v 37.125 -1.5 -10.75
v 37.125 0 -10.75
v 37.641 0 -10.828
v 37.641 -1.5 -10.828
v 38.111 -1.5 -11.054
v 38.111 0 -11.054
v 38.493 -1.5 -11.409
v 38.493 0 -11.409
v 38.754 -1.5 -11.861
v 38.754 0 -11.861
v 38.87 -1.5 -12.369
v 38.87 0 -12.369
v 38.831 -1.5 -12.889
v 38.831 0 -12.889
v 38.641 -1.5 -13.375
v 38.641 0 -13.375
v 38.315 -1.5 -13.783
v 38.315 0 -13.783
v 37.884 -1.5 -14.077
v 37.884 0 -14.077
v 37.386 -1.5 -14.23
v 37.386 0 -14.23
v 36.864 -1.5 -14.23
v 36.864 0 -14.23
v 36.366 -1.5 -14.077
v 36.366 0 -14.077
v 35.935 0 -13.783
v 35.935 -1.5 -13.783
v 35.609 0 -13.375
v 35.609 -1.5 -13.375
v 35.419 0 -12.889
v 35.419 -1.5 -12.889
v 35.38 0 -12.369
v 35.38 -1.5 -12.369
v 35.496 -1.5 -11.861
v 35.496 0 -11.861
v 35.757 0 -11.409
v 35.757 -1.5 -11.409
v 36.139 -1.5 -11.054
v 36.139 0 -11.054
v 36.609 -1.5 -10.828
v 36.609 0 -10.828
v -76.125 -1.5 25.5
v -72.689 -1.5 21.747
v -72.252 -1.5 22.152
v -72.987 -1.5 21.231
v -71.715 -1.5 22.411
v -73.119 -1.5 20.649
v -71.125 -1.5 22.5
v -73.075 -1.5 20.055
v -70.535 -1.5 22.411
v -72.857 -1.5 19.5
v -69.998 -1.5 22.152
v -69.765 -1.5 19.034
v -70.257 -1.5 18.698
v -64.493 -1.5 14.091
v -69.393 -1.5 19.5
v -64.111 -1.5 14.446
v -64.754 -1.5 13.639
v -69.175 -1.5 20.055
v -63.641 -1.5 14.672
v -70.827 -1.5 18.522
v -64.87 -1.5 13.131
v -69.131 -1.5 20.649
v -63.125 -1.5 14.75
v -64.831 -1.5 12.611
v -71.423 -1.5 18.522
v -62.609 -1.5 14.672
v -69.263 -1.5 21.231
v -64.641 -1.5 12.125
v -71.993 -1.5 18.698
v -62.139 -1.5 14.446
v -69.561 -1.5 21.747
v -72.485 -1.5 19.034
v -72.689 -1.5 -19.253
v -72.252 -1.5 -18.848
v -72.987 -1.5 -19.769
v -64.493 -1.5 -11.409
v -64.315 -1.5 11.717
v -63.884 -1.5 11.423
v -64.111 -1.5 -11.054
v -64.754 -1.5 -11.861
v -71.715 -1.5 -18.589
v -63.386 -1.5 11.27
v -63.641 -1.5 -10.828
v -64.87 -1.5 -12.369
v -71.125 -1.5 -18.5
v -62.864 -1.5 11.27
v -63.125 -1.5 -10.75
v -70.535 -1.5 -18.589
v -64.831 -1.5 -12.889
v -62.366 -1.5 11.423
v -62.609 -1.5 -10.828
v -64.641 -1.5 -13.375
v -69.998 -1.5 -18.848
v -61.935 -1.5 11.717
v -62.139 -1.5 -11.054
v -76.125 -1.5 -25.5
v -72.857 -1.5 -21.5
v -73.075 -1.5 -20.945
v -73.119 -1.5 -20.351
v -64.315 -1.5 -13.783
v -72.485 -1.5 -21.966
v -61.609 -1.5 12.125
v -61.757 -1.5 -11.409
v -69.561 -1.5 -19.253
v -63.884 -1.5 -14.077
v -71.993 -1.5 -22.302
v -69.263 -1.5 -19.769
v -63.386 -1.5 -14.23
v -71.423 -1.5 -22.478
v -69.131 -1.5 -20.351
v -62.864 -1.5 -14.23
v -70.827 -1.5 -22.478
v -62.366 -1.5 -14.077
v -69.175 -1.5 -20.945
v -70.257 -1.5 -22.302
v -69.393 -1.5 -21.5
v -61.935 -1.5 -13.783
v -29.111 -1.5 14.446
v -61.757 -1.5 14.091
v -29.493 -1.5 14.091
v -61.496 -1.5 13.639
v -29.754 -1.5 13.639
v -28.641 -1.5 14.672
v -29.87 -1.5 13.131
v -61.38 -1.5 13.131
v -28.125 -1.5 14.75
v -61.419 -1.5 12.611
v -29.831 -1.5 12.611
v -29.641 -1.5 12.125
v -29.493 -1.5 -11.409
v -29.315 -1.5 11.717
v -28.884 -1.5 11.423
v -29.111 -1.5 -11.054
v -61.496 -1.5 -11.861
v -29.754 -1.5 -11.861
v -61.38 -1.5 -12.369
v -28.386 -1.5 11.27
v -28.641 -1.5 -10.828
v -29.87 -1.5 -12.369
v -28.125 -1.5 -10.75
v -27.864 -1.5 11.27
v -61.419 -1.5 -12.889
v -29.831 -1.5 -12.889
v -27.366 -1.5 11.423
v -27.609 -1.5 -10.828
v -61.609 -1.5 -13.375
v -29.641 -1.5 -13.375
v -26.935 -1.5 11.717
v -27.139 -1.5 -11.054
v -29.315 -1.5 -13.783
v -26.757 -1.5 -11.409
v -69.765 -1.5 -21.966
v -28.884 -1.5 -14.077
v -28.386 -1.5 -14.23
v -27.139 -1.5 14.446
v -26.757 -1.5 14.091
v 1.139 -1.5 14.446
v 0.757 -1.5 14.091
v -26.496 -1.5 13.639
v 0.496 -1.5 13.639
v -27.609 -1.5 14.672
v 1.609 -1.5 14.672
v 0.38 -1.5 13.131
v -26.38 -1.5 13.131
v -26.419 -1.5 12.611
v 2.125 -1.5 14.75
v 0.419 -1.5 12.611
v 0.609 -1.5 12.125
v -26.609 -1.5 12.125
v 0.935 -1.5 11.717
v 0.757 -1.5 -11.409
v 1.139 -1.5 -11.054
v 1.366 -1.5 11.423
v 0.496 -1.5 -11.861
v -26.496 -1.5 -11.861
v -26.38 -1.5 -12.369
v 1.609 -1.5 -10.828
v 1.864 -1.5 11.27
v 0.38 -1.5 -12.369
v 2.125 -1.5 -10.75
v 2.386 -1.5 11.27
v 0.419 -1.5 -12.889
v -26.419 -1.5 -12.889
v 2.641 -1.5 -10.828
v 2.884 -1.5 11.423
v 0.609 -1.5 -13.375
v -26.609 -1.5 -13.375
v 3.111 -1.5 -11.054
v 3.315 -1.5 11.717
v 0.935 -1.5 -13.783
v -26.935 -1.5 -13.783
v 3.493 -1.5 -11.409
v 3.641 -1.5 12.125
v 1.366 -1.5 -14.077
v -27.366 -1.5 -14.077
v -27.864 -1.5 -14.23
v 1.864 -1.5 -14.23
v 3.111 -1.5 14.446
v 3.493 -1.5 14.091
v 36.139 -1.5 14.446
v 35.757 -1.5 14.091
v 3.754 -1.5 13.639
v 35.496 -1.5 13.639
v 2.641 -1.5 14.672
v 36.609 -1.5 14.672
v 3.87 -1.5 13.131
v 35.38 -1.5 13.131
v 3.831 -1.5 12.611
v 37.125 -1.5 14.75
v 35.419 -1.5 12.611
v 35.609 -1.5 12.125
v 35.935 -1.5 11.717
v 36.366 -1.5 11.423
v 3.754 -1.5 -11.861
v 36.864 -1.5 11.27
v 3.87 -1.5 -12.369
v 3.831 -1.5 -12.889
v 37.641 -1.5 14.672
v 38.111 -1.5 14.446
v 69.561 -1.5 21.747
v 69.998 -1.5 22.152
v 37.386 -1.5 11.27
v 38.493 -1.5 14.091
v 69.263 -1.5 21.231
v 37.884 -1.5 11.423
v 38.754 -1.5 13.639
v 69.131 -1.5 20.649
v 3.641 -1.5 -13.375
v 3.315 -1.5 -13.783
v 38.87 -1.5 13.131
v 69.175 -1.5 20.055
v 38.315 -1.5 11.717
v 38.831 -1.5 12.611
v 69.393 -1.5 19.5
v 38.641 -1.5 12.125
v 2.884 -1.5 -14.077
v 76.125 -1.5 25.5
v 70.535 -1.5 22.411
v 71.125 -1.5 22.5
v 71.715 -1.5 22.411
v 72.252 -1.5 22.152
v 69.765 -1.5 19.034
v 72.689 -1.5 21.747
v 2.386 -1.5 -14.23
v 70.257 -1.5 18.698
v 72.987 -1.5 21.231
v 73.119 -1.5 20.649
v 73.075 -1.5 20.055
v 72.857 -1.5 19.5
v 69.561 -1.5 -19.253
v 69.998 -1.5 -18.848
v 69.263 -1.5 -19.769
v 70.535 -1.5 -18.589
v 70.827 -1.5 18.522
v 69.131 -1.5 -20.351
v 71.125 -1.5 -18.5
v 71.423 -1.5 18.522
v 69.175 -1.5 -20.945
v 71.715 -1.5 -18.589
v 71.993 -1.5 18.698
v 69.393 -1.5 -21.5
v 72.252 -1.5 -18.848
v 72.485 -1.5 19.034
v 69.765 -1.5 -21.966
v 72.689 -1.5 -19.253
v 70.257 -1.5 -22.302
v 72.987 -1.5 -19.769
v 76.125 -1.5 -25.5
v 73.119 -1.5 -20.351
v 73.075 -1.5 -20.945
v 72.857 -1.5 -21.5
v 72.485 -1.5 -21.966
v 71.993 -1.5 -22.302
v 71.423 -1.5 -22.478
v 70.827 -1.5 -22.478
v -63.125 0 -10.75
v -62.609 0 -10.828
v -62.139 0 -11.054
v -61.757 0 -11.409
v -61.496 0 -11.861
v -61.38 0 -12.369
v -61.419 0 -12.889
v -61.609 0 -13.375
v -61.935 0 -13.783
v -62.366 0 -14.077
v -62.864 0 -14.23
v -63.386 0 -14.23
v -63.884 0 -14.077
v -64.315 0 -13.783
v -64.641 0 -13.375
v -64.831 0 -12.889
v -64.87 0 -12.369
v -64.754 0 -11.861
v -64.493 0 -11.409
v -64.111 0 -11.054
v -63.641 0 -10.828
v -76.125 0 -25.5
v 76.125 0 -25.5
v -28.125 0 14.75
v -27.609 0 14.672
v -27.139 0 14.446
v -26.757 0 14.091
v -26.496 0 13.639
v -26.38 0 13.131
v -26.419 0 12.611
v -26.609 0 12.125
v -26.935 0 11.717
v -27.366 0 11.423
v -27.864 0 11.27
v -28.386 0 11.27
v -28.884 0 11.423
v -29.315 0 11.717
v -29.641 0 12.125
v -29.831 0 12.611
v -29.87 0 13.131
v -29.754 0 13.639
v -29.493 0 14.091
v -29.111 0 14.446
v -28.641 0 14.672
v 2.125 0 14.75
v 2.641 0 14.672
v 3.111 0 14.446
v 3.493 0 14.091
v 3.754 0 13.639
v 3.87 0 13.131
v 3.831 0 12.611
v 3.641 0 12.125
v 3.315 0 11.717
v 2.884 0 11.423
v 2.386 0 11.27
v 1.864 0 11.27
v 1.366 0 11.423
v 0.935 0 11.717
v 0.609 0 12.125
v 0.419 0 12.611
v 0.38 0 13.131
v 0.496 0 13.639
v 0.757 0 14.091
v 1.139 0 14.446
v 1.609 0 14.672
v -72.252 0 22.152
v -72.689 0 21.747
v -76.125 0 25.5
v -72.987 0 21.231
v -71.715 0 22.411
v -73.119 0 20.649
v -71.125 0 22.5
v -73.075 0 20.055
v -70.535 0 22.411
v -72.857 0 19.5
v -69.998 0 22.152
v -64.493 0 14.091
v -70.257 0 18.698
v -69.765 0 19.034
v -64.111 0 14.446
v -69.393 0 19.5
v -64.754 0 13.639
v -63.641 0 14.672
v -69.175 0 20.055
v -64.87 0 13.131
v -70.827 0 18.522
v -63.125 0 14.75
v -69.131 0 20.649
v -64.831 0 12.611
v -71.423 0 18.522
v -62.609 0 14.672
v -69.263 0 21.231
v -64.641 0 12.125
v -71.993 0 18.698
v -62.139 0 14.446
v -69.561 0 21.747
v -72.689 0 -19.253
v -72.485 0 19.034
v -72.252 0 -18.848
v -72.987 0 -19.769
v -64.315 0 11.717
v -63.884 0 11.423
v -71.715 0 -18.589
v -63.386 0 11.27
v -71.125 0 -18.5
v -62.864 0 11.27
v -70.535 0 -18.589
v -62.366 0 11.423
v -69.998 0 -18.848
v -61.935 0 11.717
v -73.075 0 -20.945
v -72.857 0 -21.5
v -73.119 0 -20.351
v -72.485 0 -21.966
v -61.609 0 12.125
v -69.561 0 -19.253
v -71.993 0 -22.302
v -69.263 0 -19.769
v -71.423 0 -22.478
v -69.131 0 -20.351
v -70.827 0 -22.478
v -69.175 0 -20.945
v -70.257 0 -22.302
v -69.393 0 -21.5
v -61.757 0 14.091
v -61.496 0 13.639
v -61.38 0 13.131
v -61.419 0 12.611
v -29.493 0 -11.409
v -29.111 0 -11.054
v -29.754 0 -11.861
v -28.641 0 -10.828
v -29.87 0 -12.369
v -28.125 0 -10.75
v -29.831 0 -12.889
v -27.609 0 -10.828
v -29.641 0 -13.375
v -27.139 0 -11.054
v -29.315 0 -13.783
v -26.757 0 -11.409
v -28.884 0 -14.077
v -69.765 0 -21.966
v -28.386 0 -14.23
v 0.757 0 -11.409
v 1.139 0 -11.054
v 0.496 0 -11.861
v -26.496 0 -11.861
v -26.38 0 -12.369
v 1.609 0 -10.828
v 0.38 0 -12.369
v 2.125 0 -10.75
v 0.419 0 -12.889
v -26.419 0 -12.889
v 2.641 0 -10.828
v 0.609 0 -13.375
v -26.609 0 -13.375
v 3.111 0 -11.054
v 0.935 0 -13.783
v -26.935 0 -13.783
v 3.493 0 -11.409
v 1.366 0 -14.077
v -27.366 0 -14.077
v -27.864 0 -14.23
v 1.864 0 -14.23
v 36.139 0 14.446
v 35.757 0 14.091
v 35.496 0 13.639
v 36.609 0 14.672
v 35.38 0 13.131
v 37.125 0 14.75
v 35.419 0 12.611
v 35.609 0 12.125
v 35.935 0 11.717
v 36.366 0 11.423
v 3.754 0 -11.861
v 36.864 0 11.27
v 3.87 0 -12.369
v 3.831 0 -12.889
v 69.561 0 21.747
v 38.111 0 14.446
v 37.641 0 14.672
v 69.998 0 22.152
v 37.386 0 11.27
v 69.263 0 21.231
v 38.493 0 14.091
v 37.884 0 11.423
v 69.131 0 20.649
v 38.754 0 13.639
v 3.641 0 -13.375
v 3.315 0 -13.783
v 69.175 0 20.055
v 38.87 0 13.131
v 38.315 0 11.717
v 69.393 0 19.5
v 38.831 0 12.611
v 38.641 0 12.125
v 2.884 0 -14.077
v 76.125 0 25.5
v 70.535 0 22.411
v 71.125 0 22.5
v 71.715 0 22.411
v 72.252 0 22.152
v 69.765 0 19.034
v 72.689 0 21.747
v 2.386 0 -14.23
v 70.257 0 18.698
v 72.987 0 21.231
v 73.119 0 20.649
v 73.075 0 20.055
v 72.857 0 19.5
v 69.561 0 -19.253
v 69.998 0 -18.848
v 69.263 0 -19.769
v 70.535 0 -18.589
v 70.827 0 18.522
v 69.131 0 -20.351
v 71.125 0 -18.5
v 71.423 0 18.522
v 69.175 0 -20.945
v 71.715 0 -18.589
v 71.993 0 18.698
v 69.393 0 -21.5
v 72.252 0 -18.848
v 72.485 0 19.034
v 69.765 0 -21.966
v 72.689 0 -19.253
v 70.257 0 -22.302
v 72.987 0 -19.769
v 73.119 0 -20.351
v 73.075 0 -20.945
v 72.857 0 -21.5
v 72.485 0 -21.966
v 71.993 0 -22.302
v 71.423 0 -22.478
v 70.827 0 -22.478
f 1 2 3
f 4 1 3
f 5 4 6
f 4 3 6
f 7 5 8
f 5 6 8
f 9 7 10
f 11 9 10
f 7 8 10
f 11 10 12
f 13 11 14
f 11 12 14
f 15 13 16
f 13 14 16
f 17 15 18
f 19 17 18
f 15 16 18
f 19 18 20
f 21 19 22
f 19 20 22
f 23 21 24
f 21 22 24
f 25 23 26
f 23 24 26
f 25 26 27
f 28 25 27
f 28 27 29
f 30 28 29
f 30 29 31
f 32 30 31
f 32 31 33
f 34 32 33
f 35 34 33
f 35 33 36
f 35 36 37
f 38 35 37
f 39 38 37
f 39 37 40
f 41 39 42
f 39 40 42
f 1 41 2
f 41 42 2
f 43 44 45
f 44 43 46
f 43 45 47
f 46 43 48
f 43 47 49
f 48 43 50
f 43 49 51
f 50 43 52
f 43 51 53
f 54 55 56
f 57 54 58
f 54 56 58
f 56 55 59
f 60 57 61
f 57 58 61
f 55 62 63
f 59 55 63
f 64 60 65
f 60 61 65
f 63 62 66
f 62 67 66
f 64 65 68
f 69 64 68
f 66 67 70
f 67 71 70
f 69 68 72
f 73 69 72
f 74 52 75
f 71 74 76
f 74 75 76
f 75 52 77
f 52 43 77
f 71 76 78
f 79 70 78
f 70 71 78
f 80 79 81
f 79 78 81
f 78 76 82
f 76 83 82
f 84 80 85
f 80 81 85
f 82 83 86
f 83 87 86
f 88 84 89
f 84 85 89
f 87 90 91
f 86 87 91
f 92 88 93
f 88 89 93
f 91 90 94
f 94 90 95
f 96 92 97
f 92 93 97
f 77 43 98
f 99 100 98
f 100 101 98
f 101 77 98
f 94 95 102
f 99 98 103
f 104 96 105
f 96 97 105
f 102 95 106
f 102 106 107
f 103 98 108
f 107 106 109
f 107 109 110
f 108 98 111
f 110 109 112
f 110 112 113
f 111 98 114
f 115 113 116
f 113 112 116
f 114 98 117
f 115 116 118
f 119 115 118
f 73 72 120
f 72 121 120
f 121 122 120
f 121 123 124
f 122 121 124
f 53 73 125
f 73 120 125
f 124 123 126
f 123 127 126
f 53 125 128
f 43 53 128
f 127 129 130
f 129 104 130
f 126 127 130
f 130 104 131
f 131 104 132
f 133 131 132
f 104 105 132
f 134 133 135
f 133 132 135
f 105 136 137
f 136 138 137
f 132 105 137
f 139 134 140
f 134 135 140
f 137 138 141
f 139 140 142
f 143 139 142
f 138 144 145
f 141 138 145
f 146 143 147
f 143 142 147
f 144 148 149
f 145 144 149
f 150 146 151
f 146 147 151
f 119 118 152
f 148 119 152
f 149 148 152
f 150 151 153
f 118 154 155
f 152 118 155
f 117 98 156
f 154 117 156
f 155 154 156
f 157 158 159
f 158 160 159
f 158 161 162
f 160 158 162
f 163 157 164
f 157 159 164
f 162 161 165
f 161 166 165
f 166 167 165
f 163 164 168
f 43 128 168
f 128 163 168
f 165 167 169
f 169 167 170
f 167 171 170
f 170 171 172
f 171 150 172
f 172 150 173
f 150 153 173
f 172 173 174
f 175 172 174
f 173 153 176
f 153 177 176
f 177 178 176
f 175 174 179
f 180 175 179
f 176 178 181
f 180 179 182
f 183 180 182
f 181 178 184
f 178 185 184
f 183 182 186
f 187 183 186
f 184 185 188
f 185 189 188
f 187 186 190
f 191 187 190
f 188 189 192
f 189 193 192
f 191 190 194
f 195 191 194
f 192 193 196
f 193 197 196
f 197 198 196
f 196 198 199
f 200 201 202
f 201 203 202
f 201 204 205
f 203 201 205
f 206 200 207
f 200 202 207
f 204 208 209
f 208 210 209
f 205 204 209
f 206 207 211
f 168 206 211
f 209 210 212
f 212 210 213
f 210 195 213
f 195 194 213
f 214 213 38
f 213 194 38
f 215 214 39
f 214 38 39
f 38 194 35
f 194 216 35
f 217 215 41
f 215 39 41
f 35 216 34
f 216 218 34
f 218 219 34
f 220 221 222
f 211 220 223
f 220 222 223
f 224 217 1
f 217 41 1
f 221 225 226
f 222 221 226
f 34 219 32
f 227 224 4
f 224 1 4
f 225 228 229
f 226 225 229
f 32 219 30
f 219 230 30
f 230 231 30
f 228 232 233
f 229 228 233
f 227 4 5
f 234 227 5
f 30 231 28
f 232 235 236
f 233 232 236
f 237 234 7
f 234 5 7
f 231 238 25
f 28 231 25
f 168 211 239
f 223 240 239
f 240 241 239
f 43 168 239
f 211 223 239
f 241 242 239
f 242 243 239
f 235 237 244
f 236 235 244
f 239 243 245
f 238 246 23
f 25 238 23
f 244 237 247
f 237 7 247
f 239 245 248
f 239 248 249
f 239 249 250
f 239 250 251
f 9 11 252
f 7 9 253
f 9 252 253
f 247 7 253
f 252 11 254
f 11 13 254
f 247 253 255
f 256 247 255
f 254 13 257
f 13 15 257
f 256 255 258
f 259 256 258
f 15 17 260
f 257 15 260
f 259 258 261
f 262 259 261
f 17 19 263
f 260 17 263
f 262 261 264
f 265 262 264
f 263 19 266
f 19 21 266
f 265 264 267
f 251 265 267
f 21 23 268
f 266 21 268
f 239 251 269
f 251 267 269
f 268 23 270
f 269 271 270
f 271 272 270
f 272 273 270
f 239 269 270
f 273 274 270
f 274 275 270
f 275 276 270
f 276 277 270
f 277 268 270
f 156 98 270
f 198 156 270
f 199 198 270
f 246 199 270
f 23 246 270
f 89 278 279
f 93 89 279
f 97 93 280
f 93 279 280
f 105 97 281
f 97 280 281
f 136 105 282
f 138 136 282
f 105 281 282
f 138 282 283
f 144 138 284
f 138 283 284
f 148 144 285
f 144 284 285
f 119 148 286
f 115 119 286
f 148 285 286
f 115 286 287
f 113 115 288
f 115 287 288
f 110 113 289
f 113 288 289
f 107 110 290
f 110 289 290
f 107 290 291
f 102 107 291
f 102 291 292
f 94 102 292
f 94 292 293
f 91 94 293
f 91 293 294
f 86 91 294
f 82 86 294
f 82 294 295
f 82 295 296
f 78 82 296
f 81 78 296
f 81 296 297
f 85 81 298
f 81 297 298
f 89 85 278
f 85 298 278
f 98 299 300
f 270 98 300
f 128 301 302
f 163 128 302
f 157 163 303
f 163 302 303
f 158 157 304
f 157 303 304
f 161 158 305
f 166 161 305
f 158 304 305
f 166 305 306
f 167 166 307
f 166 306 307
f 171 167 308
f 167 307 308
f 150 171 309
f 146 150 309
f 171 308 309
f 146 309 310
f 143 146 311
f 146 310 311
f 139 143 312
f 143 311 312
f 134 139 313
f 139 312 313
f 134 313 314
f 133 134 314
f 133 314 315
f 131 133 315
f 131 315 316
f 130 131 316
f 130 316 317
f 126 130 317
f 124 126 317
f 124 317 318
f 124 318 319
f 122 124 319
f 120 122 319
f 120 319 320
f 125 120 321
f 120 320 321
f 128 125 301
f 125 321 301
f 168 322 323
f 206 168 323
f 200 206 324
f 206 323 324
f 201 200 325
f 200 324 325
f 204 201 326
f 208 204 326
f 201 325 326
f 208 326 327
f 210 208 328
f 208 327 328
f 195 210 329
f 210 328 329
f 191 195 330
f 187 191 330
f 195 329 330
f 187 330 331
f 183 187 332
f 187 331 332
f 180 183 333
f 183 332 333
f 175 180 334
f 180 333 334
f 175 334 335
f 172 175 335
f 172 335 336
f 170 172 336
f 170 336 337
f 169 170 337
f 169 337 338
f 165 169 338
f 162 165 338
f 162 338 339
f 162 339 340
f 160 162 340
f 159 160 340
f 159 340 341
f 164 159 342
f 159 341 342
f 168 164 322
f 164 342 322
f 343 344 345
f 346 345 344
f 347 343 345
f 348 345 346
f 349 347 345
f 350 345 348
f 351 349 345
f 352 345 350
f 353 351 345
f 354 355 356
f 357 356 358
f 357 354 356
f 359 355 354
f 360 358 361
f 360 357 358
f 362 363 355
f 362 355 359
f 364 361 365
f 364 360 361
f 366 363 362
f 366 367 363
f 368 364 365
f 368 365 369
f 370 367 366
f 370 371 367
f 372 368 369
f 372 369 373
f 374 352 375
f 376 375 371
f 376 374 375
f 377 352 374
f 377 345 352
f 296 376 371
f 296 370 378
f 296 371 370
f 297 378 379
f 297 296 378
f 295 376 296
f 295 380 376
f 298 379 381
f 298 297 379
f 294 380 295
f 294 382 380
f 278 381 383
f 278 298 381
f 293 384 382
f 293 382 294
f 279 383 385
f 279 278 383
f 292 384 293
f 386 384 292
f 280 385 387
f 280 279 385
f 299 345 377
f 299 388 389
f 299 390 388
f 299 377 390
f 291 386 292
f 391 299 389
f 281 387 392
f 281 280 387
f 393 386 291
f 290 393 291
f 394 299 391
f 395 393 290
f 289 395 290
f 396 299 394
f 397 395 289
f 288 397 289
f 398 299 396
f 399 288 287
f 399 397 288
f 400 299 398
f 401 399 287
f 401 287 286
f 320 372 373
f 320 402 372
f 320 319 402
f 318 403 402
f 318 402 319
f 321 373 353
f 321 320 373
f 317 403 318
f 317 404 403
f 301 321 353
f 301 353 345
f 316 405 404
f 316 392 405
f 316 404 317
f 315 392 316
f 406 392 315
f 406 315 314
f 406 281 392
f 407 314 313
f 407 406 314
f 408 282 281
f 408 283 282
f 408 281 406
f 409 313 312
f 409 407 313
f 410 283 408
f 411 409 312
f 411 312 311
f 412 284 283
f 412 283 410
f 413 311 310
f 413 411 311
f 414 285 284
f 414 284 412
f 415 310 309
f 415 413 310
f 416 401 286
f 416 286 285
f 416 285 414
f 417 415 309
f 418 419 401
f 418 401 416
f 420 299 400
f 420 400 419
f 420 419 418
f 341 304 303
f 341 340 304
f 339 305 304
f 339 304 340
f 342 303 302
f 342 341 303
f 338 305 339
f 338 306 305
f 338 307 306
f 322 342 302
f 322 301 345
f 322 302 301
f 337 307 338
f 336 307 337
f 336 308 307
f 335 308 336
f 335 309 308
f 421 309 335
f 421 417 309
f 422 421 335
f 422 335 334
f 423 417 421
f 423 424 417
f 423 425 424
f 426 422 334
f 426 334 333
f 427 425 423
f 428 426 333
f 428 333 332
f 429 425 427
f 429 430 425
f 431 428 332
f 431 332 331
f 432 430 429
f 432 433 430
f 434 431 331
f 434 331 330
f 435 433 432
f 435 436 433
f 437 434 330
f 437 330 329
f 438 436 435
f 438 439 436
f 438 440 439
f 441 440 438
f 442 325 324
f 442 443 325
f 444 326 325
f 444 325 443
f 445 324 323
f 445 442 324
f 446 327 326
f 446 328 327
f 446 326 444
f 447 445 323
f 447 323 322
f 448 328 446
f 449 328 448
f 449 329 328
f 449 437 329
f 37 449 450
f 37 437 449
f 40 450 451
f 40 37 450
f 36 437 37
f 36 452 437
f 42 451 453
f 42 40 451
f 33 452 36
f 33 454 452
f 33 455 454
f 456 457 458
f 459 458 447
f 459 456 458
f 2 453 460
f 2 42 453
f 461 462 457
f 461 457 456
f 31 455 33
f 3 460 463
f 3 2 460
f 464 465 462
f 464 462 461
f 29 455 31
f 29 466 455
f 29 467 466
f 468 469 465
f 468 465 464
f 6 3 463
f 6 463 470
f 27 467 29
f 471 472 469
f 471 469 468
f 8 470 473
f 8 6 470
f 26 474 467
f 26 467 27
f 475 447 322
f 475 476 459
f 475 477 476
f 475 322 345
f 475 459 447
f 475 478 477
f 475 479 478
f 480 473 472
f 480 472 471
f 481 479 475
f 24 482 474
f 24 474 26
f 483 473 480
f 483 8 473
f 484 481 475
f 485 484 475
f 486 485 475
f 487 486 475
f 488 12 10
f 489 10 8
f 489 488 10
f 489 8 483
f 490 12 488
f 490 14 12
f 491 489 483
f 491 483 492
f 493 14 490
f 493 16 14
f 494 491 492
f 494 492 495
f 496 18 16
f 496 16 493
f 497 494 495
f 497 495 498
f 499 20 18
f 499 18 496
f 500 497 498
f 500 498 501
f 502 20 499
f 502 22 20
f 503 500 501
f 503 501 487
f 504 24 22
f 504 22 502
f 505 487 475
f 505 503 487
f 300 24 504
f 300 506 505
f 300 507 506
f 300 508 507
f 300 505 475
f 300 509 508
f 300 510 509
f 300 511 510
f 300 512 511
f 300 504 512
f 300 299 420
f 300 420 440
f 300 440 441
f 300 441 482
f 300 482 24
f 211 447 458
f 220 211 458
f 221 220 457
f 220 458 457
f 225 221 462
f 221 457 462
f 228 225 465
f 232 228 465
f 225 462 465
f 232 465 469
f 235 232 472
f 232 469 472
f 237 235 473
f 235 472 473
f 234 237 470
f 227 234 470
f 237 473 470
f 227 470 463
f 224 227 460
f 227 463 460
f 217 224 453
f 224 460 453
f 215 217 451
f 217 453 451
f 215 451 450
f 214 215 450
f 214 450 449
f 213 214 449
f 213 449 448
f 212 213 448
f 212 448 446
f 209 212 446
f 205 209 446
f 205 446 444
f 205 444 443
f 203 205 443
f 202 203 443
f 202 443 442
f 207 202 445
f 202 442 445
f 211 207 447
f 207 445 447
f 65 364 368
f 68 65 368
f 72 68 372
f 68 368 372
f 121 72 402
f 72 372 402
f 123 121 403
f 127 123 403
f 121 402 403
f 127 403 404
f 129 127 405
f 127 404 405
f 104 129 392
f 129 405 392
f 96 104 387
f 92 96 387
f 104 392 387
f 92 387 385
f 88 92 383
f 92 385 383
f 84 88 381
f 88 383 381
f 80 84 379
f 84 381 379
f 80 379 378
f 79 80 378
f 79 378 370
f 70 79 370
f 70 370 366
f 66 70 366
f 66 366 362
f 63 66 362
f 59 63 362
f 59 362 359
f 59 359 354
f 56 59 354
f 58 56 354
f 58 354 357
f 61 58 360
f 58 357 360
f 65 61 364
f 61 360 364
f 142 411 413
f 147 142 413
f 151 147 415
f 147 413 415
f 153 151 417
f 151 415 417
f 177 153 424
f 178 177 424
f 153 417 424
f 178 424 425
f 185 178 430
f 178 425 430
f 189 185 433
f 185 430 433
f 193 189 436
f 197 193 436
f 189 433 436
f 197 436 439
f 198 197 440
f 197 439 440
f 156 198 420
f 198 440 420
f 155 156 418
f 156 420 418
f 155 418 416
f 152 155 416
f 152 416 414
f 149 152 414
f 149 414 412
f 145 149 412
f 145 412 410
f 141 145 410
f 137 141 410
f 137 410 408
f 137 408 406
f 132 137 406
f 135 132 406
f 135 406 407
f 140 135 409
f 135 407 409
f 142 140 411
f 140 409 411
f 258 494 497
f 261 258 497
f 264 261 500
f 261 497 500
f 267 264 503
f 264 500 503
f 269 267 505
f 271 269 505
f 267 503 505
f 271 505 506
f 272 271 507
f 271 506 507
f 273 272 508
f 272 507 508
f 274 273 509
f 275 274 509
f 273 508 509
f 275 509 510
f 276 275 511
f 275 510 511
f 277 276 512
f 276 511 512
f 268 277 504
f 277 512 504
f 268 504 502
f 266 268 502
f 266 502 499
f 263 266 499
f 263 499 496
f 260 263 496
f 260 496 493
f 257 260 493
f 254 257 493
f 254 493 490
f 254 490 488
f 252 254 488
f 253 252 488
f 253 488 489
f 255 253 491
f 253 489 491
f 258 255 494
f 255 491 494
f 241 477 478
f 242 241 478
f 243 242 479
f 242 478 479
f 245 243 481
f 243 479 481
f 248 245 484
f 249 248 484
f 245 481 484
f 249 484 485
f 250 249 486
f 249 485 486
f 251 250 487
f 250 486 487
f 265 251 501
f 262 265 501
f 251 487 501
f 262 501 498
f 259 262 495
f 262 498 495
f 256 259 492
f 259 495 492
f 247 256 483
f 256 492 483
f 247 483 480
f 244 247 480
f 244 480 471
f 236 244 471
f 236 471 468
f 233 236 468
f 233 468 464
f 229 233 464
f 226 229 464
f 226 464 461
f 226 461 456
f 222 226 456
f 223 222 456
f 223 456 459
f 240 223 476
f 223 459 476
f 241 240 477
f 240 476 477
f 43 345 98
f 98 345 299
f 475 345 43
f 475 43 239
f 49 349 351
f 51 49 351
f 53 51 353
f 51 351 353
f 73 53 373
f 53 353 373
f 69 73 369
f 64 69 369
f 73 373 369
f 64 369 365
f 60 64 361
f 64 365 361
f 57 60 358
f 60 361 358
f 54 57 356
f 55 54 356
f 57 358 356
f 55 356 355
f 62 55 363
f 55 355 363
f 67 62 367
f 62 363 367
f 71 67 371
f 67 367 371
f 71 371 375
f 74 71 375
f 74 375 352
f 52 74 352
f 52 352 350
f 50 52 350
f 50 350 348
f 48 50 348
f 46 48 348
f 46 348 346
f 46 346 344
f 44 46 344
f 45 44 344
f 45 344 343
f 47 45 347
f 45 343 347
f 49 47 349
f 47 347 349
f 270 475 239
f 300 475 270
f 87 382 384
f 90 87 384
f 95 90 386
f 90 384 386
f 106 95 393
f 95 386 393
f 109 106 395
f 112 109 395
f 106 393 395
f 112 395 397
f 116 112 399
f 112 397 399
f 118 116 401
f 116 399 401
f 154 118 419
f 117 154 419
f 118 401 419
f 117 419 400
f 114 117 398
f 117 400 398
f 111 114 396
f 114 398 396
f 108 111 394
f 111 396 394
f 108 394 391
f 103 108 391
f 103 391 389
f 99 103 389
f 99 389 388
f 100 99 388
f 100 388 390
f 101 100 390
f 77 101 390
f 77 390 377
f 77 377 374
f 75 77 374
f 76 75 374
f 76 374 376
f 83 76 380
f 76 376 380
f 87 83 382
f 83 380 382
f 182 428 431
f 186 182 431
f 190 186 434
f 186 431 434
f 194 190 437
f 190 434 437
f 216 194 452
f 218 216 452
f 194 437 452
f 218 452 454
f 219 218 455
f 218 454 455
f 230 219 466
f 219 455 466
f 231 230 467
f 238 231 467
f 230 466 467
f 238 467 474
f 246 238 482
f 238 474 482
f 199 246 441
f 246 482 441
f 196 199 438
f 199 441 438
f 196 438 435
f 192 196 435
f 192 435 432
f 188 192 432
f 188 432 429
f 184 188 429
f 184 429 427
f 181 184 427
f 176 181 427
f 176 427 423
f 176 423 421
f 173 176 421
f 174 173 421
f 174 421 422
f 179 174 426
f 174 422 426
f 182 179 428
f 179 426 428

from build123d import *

# Parameters (mm, degrees)
SKETCH1_W           = 152.25
SKETCH1_H           = 51
SKETCH1_R           = 1.75
SKETCH1_R_2         = 2
BOSS_EXTRUDE1_DEPTH = 1.5


with BuildPart() as part:
    # Sketch1 → Boss-Extrude1 (new body)
    with BuildSketch(Plane(origin=(0, 0, 0), x_dir=(1, 0, 0), z_dir=(0, 1, 0))):
        Rectangle(SKETCH1_W, SKETCH1_H)
        with Locations(Location((-63.125, 12.5, 0), (0, 0, 270))):
            Circle(SKETCH1_R, mode=Mode.SUBTRACT)
        with Locations(Location((-63.125, -13, 0), (0, 0, 270))):
            Circle(SKETCH1_R, mode=Mode.SUBTRACT)
        with Locations(Location((-28.125, 12.5, 0), (0, 0, 270))):
            Circle(SKETCH1_R, mode=Mode.SUBTRACT)
        with Locations(Location((-28.125, -13, 0), (0, 0, 270))):
            Circle(SKETCH1_R, mode=Mode.SUBTRACT)
        with Locations(Location((2.125, 12.5, 0), (0, 0, 270))):
            Circle(SKETCH1_R, mode=Mode.SUBTRACT)
        with Locations(Location((37.125, 12.5, 0), (0, 0, 270))):
            Circle(SKETCH1_R, mode=Mode.SUBTRACT)
        with Locations(Location((37.125, -13, 0), (0, 0, 270))):
            Circle(SKETCH1_R, mode=Mode.SUBTRACT)
        with Locations(Location((2.125, -13, 0), (0, 0, 270))):
            Circle(SKETCH1_R, mode=Mode.SUBTRACT)
        with Locations(Location((-71.125, 20.5, 0), (0, 0, 270))):
            Circle(SKETCH1_R_2, mode=Mode.SUBTRACT)
        with Locations(Location((71.125, 20.5, 0), (0, 0, 270))):
            Circle(SKETCH1_R_2, mode=Mode.SUBTRACT)
        with Locations(Location((71.125, -20.5, 0), (0, 0, 270))):
            Circle(SKETCH1_R_2, mode=Mode.SUBTRACT)
        with Locations(Location((-71.125, -20.5, 0), (0, 0, 270))):
            Circle(SKETCH1_R_2, mode=Mode.SUBTRACT)
    extrude(amount=-BOSS_EXTRUDE1_DEPTH)


solid = part.part
